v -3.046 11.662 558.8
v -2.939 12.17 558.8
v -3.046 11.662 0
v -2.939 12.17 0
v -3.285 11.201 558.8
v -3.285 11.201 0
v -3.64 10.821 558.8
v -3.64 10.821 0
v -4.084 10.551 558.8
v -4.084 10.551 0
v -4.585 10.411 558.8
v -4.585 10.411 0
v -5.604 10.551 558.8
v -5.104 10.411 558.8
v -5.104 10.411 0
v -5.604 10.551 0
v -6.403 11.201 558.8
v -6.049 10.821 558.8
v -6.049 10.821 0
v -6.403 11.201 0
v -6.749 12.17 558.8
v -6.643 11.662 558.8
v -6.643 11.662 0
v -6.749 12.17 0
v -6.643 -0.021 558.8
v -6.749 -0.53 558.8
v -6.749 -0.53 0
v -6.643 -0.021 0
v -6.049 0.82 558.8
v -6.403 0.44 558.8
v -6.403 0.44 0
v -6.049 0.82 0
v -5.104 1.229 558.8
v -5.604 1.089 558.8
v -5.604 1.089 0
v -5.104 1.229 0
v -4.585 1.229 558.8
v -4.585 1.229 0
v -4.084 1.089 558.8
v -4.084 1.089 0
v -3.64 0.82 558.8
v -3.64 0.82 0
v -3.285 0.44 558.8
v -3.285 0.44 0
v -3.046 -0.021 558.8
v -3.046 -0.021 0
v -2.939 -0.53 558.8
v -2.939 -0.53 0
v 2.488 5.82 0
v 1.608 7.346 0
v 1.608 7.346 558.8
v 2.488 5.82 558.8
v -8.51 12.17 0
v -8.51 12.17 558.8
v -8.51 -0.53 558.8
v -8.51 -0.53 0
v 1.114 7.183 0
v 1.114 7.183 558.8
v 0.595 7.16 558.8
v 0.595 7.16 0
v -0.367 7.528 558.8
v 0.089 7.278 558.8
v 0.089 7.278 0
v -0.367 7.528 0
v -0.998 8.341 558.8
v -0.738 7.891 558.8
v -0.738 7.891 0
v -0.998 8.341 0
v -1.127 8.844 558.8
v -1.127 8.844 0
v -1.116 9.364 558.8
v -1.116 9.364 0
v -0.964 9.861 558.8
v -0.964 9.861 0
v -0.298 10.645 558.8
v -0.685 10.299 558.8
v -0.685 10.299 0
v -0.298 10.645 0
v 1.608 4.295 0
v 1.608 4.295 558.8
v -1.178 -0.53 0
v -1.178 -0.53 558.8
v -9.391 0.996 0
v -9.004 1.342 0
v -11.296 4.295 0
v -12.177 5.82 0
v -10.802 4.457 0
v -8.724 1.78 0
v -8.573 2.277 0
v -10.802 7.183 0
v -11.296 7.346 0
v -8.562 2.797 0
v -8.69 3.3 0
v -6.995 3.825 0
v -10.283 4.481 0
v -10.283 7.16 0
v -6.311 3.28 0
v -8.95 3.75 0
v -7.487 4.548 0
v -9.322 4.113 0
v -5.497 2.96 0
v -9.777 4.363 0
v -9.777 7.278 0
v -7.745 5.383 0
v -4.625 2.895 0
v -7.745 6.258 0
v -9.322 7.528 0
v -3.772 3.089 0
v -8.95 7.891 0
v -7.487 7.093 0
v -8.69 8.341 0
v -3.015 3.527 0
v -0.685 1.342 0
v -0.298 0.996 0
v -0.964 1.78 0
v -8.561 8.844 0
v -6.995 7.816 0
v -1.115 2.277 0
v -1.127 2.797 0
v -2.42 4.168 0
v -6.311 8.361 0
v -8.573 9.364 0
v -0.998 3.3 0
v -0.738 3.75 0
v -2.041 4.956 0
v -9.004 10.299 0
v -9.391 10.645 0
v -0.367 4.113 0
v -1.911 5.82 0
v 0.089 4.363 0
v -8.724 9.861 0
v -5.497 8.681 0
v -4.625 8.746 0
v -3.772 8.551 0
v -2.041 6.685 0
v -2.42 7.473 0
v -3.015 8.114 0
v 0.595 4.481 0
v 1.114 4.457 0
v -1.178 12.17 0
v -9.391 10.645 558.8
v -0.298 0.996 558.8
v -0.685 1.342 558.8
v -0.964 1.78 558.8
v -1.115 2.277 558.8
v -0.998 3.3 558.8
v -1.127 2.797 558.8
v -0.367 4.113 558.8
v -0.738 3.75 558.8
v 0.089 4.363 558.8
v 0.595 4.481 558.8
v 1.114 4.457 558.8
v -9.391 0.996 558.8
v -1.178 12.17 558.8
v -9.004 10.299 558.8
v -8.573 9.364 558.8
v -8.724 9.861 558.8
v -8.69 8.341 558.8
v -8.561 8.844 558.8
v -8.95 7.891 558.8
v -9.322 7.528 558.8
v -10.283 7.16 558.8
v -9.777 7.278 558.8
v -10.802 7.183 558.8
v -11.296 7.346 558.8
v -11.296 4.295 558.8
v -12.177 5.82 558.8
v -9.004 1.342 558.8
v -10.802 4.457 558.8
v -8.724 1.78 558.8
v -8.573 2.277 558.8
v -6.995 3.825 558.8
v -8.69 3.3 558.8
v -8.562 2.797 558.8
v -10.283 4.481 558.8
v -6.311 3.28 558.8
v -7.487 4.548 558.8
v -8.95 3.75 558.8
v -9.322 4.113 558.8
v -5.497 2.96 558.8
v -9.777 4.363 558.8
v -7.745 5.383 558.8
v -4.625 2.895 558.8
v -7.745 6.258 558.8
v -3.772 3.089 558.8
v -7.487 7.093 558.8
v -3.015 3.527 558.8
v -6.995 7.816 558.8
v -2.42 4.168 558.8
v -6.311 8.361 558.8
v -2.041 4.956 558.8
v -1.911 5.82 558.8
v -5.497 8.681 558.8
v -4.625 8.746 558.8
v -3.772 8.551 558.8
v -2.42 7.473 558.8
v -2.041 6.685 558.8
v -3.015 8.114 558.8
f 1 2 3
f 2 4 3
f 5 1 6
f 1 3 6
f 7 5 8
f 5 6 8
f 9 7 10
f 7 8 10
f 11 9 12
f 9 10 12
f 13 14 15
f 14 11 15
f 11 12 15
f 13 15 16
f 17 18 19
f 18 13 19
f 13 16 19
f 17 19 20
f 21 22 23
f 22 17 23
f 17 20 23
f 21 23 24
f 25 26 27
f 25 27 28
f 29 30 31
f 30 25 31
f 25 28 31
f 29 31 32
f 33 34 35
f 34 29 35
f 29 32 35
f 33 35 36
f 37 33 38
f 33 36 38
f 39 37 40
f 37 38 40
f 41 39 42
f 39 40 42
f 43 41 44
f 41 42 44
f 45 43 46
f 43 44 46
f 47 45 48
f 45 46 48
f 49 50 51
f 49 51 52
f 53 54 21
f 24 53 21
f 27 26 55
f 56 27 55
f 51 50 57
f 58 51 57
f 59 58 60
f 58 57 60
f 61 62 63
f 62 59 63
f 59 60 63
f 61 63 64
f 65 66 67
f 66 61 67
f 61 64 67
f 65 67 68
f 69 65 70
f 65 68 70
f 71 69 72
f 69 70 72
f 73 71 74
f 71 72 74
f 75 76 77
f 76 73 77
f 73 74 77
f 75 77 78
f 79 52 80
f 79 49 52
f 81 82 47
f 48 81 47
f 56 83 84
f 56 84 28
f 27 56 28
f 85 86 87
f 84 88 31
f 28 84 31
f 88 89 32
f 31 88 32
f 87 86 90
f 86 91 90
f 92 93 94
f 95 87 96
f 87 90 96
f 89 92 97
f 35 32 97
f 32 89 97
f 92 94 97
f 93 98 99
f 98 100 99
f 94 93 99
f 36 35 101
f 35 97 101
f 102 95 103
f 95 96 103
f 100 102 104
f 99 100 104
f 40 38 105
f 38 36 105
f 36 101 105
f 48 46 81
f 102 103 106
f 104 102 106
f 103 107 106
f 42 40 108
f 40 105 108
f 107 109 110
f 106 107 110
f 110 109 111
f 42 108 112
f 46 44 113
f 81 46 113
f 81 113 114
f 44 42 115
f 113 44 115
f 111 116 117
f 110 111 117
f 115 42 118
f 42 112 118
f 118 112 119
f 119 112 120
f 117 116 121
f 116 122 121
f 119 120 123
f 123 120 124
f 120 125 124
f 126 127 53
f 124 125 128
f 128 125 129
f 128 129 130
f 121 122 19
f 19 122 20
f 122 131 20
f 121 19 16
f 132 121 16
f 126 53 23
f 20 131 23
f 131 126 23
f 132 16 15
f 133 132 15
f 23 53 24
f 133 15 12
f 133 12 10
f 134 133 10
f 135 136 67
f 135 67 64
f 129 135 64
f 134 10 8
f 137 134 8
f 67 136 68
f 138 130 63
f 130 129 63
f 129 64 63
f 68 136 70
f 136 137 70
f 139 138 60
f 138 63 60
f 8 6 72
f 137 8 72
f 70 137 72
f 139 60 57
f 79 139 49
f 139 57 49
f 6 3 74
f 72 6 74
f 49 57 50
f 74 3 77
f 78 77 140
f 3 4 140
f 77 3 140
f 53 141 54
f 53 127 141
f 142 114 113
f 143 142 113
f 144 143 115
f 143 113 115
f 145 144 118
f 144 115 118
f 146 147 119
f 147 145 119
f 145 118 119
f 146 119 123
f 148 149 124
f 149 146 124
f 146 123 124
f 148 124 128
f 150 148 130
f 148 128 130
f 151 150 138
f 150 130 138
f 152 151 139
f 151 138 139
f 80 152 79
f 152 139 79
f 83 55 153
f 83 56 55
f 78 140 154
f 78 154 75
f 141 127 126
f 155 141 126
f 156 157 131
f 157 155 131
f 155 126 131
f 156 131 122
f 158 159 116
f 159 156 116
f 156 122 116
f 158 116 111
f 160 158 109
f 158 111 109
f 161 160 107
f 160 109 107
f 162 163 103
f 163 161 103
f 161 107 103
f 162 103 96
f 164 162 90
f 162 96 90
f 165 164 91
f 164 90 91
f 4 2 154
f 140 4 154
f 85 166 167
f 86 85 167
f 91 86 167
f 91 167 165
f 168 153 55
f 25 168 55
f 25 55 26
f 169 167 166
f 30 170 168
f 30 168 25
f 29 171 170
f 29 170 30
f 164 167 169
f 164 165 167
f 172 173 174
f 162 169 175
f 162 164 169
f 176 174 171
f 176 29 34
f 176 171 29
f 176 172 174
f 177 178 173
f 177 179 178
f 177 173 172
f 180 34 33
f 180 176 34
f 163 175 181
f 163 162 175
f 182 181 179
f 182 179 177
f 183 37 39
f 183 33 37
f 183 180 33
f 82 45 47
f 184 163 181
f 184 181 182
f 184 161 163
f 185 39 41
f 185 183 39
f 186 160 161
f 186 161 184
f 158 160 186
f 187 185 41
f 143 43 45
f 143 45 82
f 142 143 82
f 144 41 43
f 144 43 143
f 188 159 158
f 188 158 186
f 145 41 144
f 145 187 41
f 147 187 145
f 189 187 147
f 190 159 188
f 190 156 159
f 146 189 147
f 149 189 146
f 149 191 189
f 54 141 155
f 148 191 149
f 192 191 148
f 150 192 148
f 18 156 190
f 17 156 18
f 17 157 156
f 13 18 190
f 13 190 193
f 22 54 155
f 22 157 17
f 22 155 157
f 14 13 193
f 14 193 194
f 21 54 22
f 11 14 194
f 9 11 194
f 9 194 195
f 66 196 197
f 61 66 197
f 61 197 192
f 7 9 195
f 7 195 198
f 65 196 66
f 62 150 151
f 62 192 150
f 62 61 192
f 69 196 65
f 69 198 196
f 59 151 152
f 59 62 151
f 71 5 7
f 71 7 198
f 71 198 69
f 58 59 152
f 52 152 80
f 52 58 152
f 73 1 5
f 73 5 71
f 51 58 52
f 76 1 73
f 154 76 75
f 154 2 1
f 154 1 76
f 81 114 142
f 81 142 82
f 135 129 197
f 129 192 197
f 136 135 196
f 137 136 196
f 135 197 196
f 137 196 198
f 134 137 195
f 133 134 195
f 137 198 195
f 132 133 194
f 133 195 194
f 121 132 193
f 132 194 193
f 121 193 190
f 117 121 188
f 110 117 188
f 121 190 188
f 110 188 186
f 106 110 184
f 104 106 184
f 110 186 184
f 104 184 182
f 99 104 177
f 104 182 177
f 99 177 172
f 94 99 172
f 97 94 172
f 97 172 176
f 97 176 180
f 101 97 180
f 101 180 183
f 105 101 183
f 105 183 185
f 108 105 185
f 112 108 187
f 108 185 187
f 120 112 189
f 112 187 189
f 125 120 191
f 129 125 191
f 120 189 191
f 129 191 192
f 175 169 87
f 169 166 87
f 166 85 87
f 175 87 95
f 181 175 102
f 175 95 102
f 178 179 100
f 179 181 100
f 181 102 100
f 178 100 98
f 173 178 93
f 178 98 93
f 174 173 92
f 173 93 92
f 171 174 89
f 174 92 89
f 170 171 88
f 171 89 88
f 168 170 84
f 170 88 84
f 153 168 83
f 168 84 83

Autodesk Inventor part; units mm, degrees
ref_plane "YZ Plane" through (0, 0, 0) normal (1, 0, 0) x (0, 1, 0)
ref_plane "XZ Plane" through (0, 0, 0) normal (0, 1, 0) x (-1, 0, 0)
ref_plane "XY Plane" through (0, 0, 0) normal (0, 0, 1) x (1, 0, 0)
sketch "Sketch1" plane through (0, 0, 0) normal (0, 0, 1) x (1, 0, 0)
  circle A0 centre (-4.8443, 5.8204) radius 6.35 construction
  arc A1 (-6.7493, 12.1704) -> (-2.9393, 12.1704) centre (-4.8443, 12.3033) ccw
  line L0 (-8.5105, 12.1704) -> (-6.7493, 12.1704)
  line L1 (-2.9393, 12.1704) -> (-1.1781, 12.1704)
  arc A2 (-0.2975, 10.6452) -> (1.6075, 7.3457) centre (0.7701, 9.0619) ccw
  arc A3 (1.6075, 4.2952) -> (-0.2975, 0.9957) centre (0.7701, 2.579) ccw
  arc A4 (-2.9393, -0.5296) -> (-6.7493, -0.5296) centre (-4.8443, -0.6625) ccw
  arc A5 (-9.3911, 0.9957) -> (-11.2961, 4.2952) centre (-10.4586, 2.579) ccw
  arc A6 (-11.2961, 7.3457) -> (-9.3911, 10.6452) centre (-10.4586, 9.0619) ccw
  line L2 (-12.1766, 5.8204) -> (-11.2961, 7.3457)
  line L3 (-8.5105, -0.5296) -> (-9.3911, 0.9957)
  line L4 (-1.1781, -0.5296) -> (-2.9393, -0.5296)
  line L5 (2.4881, 5.8204) -> (1.6075, 4.2952)
  line L6 (-1.1781, 12.1704) -> (-0.2975, 10.6452)
  line L7 (-9.3911, 10.6452) -> (-8.5105, 12.1704)
  line L8 (-11.2961, 4.2952) -> (-12.1766, 5.8204)
  line L9 (-6.7493, -0.5296) -> (-8.5105, -0.5296)
  line L10 (-0.2975, 0.9957) -> (-1.1781, -0.5296)
  line L11 (1.6075, 7.3457) -> (2.4881, 5.8204)
  point P0 (0, 0)
  point P1 (-4.8443, -0.5296)
  point P2 (-4.8443, 12.1704)
  point P3 (0.655, 8.9954)
  point P4 (0.655, 2.6454)
  point P5 (-4.8443, -0.5296)
  point P6 (-10.3436, 2.6454)
  point P7 (-10.3436, 8.9954)
  point P8 (-0.2975, 10.6452)
  point P9 (-9.3911, 10.6452)
  point P10 (-11.2961, 4.2952)
  point P11 (-9.3911, 0.9957)
  point P12 (-6.7493, -0.5296)
  point P13 (-2.9393, -0.5296)
  point P14 (1.6075, 7.3457)
  dimension "d2" = 12.7
  dimension "d7" = 360
  dimension "d11" = 360
  dimension "d15" = 360
extrude "Extrusion1" add sketch "Sketch1" along normal blind 558.8
sketch "Sketch2" plane through (0, 0, 558.8) normal (0, 0, 1) x (1, 0, 0)
  circle A0 centre (-4.8443, 5.8204) radius 2.9337
  line L0 (-8.5105, -0.5296) -> (-6.7493, -0.5296) projected
  line L1 (-8.5105, 12.1704) -> (-8.5105, -0.5296) construction
  line L2 (-1.1781, 12.1704) -> (-2.9393, 12.1704) projected
  line L3 (-2.9393, -0.5296) -> (-1.1781, -0.5296) projected
  line L4 (-1.1781, 12.1704) -> (-1.1781, -0.5296) construction
  line L5 (-4.8443, 9.4005) -> (-4.8443, 3.0295) construction
  point P0 (0, 0)
  dimension "d19" = 6.35
  dimension "d20" = 5.8674
extrude "Extrusion2" cut sketch "Sketch2" against normal blind 558.8
equation "\"d17\" = d23"
equation "\"d21\" = d23"
equation "\"d23\" = 558.8"
properties part number "Churro 22in"
